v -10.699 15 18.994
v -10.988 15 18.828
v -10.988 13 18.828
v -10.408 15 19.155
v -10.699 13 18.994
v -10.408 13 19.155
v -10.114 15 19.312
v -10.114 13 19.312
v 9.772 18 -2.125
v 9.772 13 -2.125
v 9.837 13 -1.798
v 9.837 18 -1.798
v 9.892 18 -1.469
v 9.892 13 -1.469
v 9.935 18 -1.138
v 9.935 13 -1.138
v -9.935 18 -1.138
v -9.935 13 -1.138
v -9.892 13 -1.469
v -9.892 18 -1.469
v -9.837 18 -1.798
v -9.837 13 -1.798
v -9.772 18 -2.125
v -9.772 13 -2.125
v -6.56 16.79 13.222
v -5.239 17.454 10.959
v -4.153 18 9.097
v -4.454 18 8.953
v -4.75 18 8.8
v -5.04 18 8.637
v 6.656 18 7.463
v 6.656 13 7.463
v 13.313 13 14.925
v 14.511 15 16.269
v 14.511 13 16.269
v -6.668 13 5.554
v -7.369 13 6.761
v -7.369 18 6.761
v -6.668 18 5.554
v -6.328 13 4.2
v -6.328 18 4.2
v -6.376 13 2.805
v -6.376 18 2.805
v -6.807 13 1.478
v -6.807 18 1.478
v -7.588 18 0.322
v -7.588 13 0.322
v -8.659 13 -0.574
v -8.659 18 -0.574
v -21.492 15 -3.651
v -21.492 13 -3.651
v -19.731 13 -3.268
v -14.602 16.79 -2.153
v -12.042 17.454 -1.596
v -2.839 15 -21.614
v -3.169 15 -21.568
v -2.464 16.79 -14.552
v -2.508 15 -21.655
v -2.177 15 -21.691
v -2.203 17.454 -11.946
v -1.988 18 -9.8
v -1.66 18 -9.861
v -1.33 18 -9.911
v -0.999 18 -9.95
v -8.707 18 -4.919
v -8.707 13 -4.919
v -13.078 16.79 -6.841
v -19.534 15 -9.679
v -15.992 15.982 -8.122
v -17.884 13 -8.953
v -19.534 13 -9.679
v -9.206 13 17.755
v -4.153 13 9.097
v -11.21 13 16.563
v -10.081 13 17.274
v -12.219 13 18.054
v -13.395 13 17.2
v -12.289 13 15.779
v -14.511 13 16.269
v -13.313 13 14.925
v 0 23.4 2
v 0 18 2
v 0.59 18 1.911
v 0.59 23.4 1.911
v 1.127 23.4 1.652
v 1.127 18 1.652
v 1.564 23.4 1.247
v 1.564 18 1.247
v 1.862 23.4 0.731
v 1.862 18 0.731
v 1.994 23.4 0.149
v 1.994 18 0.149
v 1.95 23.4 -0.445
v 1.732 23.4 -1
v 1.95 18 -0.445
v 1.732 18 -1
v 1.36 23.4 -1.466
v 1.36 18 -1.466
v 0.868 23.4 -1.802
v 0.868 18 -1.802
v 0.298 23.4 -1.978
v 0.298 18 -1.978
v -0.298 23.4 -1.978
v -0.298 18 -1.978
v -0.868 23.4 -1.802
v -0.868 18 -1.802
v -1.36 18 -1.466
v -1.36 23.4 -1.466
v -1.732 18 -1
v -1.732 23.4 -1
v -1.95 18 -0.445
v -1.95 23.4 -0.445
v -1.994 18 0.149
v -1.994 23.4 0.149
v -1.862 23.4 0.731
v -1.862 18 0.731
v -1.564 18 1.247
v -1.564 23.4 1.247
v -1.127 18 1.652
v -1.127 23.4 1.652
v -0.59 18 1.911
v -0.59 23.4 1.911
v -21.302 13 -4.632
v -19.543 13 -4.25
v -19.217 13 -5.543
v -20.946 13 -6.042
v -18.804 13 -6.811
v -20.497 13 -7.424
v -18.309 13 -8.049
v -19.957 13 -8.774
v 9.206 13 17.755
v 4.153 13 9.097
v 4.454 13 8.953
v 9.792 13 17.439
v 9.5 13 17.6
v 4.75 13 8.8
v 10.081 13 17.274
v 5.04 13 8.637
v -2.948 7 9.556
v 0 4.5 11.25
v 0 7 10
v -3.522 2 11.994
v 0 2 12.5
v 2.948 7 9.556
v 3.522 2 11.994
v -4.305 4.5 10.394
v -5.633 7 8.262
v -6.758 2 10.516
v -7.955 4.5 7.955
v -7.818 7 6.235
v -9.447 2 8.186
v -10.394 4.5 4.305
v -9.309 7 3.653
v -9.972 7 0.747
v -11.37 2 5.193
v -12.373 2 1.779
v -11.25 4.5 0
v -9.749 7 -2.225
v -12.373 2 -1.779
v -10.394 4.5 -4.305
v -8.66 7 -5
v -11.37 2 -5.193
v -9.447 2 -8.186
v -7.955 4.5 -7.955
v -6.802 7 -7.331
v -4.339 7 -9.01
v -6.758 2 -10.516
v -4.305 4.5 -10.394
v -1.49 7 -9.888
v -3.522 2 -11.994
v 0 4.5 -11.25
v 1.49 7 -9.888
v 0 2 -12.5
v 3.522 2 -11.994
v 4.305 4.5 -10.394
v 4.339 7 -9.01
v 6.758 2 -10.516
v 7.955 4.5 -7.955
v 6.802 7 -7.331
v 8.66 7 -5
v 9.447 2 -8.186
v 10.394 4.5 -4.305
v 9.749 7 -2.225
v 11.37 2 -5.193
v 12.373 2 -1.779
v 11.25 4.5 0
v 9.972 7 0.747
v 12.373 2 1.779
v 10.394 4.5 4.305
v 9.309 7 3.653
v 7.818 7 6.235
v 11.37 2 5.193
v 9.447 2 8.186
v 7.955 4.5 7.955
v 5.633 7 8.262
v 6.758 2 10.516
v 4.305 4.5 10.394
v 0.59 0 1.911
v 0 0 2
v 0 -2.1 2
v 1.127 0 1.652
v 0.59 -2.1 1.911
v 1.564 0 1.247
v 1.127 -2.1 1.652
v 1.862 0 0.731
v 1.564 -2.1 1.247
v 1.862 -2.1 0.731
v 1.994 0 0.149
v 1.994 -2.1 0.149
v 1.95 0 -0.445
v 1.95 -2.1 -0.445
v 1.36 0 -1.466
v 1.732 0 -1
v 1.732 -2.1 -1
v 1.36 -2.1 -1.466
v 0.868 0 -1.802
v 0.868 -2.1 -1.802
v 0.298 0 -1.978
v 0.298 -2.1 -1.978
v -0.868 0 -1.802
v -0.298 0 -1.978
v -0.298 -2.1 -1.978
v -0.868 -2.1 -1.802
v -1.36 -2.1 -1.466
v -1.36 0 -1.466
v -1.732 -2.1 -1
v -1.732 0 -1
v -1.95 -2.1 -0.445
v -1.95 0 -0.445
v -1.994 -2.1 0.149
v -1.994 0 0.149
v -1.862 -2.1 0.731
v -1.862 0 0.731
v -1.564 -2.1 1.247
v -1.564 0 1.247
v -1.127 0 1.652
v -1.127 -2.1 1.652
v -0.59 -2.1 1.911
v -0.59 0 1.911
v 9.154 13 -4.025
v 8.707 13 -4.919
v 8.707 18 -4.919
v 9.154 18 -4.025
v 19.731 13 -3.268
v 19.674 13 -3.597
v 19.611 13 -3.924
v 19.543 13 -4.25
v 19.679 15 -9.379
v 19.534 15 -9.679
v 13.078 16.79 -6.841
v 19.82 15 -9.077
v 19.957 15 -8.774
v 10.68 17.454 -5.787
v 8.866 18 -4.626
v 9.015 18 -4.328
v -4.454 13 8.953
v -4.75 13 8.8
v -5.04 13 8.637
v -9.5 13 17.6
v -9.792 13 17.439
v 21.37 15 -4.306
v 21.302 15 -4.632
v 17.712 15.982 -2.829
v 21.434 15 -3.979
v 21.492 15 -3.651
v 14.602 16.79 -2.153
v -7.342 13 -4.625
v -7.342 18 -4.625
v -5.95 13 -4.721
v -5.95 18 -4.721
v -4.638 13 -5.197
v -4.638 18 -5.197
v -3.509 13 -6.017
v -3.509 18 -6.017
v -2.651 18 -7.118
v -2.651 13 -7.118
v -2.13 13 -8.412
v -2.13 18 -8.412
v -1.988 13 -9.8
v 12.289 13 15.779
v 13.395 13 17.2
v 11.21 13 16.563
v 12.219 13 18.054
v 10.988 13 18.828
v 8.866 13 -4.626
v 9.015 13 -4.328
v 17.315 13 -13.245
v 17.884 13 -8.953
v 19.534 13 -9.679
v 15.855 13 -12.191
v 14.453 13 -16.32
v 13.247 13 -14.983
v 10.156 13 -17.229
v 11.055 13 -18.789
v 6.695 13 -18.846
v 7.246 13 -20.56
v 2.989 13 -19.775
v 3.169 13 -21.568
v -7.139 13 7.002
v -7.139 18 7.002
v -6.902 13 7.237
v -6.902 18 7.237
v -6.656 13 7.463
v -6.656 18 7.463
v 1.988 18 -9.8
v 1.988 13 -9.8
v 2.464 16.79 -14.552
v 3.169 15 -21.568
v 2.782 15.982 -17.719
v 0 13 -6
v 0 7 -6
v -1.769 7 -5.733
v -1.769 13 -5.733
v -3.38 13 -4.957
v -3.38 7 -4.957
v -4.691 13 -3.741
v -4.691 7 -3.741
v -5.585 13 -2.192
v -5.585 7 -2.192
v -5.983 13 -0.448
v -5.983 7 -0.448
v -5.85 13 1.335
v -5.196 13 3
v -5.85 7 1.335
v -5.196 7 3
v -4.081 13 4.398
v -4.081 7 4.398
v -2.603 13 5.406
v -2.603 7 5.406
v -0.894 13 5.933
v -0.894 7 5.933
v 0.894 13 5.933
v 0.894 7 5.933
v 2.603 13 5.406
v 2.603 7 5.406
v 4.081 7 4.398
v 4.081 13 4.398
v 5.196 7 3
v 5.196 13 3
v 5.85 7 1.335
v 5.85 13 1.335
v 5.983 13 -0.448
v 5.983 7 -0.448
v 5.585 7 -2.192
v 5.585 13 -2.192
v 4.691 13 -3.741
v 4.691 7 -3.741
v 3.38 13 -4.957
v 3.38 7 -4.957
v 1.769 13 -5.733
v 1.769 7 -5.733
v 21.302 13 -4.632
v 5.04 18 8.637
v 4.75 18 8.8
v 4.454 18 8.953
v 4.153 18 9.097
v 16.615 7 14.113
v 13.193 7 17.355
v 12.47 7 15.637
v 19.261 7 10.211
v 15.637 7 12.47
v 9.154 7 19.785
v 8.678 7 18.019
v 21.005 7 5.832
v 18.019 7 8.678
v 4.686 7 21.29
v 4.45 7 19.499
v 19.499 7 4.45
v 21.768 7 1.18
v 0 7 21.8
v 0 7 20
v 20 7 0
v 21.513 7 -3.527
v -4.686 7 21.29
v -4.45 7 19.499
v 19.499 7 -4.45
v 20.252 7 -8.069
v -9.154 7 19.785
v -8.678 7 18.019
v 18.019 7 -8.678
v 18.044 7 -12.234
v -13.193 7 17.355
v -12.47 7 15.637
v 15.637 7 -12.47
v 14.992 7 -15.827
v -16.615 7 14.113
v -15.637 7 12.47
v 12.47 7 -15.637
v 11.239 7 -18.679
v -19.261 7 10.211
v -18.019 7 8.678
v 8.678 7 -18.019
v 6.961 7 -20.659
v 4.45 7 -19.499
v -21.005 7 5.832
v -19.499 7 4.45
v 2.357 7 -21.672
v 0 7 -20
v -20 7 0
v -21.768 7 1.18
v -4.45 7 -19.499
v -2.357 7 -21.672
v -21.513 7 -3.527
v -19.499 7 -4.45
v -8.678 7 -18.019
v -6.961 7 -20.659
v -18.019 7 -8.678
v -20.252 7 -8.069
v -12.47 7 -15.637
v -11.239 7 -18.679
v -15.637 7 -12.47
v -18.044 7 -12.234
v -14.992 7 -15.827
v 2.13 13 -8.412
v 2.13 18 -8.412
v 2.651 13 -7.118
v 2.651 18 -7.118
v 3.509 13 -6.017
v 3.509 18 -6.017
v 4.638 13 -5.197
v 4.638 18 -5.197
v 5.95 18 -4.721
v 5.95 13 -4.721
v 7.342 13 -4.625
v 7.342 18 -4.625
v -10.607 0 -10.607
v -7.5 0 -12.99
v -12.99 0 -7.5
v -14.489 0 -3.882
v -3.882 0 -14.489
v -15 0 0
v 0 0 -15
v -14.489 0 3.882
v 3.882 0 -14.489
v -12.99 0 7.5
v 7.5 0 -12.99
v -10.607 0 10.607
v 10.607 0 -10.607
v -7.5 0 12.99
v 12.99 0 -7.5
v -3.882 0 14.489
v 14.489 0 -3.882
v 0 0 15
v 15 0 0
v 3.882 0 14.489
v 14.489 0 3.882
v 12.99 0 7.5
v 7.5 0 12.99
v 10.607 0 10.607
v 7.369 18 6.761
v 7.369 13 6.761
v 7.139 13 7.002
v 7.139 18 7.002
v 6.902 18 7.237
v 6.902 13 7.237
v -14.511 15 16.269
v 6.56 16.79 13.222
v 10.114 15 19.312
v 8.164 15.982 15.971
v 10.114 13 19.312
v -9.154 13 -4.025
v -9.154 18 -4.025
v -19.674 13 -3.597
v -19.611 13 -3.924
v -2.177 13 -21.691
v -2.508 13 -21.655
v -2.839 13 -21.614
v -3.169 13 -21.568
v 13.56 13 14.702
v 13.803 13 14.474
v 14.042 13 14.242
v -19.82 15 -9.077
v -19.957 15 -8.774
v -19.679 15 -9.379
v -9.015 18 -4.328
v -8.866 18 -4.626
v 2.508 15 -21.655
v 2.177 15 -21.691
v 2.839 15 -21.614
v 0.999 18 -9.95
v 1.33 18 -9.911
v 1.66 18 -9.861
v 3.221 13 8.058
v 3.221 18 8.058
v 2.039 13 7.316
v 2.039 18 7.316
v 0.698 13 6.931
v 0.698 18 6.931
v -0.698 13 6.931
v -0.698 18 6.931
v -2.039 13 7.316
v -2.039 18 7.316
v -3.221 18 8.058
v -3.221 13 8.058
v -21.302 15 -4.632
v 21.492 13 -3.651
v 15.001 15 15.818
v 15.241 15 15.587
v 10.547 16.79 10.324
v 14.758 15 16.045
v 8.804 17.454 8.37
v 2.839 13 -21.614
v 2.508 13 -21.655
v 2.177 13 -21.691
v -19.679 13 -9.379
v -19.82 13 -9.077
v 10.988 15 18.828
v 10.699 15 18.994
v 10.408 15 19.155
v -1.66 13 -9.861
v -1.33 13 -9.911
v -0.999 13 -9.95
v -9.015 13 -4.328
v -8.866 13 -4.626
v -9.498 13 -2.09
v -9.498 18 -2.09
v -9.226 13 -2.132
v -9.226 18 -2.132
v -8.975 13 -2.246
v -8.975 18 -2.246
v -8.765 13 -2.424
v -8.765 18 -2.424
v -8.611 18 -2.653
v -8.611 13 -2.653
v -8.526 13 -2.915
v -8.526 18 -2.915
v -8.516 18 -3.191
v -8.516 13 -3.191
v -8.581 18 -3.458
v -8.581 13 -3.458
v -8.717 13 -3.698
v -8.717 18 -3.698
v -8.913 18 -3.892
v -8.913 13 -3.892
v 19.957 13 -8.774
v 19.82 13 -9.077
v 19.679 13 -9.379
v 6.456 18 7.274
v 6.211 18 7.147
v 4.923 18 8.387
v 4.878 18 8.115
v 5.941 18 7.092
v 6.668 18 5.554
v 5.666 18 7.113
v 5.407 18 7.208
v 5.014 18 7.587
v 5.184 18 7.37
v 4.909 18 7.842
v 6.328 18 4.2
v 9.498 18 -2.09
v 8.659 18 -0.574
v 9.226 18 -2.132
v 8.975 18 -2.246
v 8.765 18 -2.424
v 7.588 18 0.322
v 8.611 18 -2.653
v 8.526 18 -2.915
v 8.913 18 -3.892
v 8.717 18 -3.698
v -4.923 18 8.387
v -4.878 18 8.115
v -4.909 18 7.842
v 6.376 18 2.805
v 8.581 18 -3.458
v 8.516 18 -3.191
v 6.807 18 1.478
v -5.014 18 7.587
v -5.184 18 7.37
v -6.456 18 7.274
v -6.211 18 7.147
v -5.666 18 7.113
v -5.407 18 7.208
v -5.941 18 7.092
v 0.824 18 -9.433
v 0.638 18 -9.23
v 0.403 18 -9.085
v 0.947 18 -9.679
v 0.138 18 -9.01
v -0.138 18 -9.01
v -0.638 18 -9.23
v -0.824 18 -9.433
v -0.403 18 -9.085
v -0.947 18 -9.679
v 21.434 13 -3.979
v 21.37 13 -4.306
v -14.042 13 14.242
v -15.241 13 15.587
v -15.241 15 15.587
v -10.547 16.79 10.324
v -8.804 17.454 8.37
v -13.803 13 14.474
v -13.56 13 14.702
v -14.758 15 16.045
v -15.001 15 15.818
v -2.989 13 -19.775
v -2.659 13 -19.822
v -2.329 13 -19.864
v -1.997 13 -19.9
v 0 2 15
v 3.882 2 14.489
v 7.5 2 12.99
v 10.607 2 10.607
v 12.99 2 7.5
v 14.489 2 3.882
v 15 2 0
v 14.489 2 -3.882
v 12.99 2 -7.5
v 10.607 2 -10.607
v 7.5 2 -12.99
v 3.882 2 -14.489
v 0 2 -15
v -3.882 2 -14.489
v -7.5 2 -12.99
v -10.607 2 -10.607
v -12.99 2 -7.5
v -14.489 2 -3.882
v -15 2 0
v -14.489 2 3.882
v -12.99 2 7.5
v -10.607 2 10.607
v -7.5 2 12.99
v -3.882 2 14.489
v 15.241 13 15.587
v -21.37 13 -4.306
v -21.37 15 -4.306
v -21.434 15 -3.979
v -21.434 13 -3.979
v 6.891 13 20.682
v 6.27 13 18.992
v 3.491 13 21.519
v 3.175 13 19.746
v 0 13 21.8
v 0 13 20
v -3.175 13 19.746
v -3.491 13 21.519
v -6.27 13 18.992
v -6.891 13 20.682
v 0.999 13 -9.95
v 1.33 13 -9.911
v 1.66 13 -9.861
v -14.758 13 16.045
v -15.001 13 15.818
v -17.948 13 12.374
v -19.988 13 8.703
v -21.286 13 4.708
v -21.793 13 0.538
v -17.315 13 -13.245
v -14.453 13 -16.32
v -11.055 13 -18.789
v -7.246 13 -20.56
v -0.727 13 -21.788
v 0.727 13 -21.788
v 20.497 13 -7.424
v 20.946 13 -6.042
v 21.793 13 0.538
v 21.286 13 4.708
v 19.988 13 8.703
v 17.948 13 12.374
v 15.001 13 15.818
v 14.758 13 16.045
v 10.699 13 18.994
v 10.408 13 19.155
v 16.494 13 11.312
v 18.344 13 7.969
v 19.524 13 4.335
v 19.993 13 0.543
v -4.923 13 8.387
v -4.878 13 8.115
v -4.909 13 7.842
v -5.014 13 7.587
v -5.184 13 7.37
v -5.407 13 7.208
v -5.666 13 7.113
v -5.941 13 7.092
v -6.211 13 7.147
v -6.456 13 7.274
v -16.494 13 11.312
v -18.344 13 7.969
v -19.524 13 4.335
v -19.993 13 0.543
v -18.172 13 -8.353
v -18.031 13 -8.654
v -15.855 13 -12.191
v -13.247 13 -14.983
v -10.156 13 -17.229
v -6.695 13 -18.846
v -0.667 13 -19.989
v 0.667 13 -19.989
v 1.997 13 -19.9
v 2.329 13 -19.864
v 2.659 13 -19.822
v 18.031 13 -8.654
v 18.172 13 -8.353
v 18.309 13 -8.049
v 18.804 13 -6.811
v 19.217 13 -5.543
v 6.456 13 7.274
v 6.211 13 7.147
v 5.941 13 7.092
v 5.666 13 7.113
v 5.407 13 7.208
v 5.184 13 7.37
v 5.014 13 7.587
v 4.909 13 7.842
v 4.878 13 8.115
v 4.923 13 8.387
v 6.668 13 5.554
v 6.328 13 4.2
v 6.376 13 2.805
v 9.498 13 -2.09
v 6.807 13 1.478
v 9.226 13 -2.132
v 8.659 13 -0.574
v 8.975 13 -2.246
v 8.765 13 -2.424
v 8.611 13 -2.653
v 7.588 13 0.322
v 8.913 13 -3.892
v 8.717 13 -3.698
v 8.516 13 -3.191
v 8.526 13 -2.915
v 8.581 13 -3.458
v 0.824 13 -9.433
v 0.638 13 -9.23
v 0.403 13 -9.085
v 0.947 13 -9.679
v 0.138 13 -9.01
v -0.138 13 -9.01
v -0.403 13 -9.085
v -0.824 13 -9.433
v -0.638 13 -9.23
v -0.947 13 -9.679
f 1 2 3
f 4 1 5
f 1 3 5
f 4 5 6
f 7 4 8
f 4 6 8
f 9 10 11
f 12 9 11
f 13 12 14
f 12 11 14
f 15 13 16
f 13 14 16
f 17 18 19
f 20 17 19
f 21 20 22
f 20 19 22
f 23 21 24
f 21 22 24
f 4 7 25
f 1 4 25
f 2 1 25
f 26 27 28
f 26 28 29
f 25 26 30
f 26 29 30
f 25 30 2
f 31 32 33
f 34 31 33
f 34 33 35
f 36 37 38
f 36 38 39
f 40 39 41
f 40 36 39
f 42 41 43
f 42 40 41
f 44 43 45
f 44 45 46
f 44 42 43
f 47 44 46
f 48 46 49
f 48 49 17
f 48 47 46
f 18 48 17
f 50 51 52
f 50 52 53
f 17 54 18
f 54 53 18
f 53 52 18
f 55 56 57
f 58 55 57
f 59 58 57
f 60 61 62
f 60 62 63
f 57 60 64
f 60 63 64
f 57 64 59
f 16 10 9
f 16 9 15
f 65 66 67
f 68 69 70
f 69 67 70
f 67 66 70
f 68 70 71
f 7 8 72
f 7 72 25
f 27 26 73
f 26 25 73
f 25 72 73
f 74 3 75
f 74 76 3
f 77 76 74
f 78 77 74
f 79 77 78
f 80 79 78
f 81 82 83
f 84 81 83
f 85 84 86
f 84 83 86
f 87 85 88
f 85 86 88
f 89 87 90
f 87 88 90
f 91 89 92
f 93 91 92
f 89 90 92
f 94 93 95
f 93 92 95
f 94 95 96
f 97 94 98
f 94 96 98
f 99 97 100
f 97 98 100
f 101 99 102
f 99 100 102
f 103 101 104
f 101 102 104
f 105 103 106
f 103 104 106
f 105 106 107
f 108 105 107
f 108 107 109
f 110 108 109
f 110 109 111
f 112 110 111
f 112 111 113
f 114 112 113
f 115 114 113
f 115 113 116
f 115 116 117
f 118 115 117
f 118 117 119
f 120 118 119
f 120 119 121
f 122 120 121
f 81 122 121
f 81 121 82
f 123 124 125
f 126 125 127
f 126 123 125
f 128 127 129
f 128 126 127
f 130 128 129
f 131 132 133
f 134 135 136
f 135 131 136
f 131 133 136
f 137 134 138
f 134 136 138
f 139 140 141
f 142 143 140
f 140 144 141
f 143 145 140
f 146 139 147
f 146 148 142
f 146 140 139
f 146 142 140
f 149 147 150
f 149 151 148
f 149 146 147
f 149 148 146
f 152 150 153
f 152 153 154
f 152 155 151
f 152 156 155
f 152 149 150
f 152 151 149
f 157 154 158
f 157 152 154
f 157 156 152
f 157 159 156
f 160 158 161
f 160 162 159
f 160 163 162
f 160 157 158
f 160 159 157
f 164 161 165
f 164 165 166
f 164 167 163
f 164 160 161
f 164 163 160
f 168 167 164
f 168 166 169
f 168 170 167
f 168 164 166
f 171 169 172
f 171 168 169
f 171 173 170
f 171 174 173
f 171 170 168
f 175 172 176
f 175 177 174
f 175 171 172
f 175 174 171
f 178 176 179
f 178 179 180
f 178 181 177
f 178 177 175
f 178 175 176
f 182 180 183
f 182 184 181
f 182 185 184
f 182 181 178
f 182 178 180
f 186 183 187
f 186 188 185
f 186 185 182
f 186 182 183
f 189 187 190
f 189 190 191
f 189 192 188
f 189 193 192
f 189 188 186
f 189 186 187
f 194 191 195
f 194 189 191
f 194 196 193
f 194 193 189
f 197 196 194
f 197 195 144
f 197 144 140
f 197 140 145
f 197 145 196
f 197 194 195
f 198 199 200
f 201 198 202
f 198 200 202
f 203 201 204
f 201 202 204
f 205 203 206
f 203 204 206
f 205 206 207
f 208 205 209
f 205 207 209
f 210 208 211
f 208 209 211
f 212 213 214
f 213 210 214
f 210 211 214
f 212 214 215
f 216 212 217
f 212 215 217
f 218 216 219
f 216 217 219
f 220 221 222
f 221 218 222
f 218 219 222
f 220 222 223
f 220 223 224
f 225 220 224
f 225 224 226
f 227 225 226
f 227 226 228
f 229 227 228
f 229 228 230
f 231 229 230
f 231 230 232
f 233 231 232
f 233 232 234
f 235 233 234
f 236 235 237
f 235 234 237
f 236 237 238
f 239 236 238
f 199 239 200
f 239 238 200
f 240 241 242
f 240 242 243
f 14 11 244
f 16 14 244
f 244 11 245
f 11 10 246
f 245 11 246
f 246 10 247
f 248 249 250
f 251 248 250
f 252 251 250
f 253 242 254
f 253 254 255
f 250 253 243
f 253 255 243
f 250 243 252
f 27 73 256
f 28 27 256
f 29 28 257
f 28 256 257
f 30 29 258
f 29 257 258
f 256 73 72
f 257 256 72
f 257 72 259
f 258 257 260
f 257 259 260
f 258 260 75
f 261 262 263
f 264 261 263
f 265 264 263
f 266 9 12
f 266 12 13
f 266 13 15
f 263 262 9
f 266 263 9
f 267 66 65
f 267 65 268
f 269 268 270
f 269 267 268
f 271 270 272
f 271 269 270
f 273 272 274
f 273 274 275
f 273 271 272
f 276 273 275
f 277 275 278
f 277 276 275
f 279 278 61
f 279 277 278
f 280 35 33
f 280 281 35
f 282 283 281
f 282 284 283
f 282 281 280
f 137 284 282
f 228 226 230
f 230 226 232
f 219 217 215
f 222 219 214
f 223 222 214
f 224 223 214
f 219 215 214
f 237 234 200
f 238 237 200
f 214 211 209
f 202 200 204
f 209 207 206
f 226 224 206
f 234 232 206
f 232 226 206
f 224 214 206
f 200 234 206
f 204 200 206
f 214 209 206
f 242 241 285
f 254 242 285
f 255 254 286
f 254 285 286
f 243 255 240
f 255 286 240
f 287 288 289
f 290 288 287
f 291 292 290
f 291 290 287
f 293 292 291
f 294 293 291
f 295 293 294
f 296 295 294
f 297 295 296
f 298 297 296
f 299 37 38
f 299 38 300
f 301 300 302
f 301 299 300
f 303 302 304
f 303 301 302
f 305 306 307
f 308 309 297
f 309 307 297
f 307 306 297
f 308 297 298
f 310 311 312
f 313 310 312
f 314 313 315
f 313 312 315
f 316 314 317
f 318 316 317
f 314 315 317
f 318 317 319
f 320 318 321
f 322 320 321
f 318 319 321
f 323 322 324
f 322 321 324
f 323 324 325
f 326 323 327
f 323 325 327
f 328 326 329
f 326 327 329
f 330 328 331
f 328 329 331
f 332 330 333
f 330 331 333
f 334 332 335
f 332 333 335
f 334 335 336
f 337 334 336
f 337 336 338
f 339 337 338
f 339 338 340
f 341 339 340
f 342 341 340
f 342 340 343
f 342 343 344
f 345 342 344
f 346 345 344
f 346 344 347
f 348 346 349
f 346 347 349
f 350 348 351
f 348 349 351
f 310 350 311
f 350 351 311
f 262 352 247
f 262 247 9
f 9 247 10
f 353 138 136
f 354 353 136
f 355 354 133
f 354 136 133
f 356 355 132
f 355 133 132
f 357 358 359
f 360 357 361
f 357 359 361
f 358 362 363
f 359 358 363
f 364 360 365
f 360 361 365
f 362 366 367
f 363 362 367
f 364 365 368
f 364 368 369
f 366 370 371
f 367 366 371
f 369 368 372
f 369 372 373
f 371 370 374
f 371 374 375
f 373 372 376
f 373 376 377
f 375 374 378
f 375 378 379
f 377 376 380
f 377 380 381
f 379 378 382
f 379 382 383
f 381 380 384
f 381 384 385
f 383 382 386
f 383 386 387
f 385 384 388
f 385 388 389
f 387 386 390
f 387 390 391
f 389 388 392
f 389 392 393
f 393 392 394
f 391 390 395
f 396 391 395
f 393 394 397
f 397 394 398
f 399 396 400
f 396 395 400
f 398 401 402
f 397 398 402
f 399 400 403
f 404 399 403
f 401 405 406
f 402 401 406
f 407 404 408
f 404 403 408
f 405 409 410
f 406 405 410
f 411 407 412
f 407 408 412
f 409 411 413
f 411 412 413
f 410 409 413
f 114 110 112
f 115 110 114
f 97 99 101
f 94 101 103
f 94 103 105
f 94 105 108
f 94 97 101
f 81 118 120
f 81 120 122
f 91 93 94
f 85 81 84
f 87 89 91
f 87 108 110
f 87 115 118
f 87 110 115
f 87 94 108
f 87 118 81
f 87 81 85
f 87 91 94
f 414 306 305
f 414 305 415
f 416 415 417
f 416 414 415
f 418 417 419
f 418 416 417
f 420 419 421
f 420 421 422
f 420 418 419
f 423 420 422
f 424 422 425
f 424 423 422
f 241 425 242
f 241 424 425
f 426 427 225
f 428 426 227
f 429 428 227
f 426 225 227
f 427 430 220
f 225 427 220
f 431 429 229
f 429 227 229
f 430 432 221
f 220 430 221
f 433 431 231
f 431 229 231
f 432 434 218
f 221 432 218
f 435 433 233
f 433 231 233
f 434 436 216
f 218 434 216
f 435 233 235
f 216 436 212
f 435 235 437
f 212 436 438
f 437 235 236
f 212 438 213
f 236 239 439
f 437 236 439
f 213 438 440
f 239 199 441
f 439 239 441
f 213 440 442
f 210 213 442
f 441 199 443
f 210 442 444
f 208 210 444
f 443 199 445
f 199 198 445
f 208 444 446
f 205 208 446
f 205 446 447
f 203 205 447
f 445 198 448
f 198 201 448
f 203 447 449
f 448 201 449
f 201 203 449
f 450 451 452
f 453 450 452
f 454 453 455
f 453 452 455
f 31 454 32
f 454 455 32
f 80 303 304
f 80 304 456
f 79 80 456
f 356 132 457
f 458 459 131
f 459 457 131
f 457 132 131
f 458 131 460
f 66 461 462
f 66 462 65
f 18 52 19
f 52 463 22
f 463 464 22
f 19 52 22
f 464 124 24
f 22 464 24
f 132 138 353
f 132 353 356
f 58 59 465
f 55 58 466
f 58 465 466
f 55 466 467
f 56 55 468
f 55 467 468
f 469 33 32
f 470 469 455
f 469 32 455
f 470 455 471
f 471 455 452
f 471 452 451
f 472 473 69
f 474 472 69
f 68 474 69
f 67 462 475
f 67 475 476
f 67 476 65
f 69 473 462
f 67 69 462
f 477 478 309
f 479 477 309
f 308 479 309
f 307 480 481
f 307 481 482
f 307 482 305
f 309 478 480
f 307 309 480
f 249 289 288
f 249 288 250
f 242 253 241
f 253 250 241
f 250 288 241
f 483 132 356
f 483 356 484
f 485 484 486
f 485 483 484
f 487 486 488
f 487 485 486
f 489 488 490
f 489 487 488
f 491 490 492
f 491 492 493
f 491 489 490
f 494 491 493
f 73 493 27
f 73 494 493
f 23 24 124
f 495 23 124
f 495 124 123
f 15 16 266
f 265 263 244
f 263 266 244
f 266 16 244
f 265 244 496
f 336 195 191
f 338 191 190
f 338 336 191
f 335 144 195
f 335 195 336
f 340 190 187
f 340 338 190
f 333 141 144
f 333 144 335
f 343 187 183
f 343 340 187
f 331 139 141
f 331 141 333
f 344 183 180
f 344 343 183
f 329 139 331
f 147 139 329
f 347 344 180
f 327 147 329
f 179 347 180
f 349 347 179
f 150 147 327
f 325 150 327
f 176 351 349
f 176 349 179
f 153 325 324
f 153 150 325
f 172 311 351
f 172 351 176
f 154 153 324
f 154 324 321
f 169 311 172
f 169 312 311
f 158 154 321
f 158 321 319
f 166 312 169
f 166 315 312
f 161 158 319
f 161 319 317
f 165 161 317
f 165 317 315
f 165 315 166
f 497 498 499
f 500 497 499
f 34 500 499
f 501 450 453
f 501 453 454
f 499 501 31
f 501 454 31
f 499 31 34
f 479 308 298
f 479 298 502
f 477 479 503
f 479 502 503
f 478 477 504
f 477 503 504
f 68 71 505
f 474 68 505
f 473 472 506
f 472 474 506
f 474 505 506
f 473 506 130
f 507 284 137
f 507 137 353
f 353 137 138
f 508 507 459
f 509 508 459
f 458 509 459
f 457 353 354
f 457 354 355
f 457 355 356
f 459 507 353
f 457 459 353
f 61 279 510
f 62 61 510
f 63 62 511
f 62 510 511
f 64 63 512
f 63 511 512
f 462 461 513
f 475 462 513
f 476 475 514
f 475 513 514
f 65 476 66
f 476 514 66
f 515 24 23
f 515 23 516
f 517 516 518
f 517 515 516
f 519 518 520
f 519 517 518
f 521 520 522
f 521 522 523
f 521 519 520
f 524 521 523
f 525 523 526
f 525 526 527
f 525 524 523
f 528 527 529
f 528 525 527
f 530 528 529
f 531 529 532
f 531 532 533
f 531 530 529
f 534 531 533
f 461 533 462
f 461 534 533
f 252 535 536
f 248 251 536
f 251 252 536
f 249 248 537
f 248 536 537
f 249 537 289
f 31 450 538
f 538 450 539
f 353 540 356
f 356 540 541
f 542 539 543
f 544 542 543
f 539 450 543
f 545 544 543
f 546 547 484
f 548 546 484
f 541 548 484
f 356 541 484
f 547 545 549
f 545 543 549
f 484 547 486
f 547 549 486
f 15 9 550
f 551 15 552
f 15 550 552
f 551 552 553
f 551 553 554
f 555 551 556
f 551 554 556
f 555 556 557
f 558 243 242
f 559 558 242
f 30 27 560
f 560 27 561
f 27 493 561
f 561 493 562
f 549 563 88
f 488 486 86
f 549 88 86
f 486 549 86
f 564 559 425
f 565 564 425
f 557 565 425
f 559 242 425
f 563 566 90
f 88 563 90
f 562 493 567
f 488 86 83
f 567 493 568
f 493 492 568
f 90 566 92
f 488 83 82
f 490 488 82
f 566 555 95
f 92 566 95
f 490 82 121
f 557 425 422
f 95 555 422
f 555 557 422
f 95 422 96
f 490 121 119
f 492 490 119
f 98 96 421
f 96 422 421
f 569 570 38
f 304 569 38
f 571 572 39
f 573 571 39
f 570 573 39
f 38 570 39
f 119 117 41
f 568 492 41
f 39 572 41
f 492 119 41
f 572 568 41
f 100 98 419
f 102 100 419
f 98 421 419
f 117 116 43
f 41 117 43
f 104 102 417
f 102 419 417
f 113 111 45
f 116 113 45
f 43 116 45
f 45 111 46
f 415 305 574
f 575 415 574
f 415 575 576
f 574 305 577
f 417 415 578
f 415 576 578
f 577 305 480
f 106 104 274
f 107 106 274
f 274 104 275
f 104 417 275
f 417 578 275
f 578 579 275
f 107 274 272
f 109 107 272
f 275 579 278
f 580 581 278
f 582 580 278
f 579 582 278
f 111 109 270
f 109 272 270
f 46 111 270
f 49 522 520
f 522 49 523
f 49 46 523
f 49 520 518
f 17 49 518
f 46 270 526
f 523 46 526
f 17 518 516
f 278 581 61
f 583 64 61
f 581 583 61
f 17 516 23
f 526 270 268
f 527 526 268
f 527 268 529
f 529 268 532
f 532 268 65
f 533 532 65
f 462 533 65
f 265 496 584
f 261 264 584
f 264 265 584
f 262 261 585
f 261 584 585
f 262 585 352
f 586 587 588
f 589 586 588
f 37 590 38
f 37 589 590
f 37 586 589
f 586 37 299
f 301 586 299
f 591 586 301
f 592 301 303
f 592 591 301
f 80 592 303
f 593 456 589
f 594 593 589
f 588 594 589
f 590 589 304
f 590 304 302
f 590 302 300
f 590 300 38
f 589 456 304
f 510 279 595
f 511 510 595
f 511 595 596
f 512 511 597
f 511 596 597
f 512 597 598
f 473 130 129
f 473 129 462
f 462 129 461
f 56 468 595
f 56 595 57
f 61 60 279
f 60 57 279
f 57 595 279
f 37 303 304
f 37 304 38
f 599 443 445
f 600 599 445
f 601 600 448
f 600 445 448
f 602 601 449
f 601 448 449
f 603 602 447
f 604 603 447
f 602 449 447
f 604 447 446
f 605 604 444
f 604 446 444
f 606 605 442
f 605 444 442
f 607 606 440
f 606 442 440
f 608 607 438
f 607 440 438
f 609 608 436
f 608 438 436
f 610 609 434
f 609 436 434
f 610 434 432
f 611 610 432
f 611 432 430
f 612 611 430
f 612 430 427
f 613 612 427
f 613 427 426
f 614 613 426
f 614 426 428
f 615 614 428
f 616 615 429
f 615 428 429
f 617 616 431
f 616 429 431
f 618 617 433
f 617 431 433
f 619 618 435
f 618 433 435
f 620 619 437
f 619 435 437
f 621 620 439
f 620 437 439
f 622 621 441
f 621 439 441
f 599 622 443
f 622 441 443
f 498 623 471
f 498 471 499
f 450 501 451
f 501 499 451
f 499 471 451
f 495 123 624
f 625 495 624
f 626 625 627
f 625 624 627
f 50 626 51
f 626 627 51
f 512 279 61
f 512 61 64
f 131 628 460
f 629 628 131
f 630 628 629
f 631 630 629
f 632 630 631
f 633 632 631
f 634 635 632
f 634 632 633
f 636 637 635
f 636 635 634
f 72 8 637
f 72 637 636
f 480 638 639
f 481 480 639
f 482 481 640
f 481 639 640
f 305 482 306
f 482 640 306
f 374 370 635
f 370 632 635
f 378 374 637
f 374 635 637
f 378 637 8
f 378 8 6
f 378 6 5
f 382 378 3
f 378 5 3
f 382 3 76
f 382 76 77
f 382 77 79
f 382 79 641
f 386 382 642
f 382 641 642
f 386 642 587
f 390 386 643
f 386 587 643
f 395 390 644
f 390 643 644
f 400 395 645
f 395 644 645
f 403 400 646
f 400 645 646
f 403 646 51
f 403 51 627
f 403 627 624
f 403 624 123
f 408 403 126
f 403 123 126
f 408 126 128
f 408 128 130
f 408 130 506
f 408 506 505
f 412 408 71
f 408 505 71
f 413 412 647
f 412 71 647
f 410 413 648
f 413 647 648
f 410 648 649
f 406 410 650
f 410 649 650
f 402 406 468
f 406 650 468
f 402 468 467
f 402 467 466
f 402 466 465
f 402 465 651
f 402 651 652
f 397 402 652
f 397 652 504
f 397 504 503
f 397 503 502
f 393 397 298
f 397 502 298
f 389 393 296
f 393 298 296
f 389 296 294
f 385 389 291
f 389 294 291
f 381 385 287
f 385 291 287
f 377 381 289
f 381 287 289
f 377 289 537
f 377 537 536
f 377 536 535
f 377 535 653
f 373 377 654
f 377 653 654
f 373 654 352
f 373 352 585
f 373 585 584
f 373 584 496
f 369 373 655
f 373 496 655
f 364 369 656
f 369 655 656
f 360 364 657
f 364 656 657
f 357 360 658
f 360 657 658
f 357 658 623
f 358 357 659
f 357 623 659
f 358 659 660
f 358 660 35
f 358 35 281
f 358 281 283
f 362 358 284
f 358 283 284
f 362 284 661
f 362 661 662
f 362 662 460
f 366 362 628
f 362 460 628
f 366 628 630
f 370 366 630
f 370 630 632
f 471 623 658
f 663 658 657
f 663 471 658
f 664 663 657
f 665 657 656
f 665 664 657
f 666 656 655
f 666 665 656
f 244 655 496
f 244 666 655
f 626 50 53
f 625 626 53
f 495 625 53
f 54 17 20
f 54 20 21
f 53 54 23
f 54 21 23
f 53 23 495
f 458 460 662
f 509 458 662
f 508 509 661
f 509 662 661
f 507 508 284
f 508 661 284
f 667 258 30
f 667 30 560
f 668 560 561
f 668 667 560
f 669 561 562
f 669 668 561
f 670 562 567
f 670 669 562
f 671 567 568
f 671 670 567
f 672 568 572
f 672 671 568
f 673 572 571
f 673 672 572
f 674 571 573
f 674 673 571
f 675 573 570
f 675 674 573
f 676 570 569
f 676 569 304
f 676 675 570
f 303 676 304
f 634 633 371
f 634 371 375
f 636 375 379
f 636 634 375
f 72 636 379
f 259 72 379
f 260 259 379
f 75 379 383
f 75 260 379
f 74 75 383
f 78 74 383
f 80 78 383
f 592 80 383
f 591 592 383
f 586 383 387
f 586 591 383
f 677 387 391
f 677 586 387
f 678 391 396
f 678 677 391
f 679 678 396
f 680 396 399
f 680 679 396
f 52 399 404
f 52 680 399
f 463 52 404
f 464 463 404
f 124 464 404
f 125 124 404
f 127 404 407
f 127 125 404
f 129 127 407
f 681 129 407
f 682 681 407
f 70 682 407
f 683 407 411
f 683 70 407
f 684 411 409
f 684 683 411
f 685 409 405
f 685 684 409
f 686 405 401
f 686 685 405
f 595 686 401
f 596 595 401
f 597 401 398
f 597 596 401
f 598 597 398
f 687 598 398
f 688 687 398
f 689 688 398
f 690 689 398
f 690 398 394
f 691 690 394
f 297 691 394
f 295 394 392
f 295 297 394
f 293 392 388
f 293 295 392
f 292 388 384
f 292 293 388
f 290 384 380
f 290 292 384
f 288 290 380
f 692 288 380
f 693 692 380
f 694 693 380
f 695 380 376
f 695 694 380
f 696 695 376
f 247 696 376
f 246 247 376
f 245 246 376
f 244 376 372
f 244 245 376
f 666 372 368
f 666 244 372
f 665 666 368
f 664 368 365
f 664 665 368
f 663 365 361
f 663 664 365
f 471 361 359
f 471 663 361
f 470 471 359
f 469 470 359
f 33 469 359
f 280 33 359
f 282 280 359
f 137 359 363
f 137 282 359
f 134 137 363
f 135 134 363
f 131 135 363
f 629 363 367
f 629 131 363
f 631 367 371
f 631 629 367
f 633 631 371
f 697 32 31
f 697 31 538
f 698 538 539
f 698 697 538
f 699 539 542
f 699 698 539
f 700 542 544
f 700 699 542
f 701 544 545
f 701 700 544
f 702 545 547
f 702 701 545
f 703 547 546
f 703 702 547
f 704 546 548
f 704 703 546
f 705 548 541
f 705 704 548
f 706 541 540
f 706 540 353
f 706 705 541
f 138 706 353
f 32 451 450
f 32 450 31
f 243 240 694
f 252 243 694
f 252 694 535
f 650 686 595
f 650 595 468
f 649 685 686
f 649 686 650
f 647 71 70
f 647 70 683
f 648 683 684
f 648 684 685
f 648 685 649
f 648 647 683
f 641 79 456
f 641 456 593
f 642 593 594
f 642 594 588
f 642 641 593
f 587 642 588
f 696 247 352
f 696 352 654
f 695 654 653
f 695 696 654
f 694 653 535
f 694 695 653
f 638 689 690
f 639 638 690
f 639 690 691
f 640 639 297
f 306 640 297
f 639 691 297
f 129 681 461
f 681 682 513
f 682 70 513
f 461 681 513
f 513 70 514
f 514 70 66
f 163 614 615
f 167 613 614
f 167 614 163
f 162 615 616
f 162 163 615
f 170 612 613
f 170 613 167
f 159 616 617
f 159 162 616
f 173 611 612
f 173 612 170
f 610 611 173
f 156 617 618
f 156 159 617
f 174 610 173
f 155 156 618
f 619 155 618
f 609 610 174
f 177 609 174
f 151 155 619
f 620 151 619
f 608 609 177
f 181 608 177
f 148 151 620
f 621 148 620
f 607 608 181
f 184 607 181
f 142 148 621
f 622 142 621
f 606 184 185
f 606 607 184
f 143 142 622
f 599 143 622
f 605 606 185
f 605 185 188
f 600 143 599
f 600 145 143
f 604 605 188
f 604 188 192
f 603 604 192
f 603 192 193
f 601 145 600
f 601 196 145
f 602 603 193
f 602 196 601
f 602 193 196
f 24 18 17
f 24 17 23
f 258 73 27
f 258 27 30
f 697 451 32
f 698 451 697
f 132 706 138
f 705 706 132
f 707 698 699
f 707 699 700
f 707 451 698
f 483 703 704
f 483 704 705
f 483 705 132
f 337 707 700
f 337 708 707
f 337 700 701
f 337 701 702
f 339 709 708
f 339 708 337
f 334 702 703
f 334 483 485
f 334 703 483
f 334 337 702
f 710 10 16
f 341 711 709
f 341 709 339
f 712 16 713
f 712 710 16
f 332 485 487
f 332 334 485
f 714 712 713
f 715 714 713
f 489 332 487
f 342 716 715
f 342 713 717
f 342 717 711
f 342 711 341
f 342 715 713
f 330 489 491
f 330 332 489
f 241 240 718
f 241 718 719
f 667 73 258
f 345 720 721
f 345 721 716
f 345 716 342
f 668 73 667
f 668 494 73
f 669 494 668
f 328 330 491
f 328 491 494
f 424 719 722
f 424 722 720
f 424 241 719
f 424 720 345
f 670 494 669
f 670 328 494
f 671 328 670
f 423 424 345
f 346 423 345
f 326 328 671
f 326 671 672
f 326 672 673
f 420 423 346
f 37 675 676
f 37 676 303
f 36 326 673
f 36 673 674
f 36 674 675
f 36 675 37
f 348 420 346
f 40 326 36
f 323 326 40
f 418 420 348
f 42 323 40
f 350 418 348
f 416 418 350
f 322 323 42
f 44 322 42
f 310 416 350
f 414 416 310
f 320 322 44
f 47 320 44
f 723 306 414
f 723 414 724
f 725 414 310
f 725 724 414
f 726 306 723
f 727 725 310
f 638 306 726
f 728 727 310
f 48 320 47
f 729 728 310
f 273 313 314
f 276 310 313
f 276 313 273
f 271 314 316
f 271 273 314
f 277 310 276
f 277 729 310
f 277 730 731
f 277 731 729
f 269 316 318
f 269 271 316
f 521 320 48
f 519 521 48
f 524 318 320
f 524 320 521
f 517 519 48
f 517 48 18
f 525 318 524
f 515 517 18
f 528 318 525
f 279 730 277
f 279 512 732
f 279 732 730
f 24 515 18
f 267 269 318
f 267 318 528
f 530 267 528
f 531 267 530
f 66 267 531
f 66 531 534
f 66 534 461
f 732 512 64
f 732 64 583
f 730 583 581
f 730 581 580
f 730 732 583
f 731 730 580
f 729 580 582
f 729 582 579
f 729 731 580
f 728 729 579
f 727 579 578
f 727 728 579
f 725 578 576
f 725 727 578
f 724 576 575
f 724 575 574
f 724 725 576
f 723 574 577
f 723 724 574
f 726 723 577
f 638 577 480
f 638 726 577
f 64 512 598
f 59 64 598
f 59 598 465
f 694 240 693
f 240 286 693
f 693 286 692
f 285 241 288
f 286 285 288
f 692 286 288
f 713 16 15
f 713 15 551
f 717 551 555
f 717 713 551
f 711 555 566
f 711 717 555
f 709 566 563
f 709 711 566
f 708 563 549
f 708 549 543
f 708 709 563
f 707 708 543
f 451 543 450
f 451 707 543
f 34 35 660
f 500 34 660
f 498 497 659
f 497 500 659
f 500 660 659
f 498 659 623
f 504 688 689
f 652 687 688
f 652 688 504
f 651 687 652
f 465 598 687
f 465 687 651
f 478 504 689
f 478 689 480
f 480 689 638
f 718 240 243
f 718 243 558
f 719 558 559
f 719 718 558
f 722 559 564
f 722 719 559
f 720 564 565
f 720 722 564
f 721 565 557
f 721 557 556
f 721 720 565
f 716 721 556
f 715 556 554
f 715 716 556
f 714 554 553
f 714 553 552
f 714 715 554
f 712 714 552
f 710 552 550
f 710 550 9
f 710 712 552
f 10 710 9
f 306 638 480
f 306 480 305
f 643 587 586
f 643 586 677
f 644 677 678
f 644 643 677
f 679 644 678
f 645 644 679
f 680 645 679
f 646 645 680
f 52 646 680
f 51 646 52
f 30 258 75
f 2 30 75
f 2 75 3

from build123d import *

# Parameters (mm, degrees)
SKETCH_4_R               = 15
EXTRUDE_2_DEPTH          = 2
EXTRUDE_3_DEPTH          = 21.4
EXTRUDE_3_DEPTH_BACK     = 4.1
SKETCH_5_R               = 2
SKETCH_9_W               = 1.8
SKETCH_9_H               = 6
SKETCH_10_R              = 6
SKETCH_10_R_2            = 2
EXTRUDE_5_DEPTH          = 6
SKETCH_11_R              = 2
EXTRUDE_6_DEPTH          = 5
EXTRUDE_7_DEPTH          = 5
PATTERN_START            = 13
PATTERN_CIRCULAR_1_DEPTH = 5


# Read off the part's stored shape, not the designer's step: 阵列(圆周)1
with BuildPart() as part:
    # 草图4 → 凸台-拉伸2 (new body)
    with BuildSketch(Plane(origin=(0, 0, 0), x_dir=(1, 0, 0), z_dir=(0, 1, 0))):
        with Locations(Location((0, 0, 0), (0, 0, 270))):
            Circle(SKETCH_4_R)
    extrude(amount=EXTRUDE_2_DEPTH)

    # 草图5 → 凸台-拉伸3 (add, two sides: drawn at the far end of the back side and taken through both)
    with BuildSketch(Plane(origin=(0, 2, 0), x_dir=(1, 0, 0), z_dir=(0, 1, 0)).offset(-EXTRUDE_3_DEPTH_BACK)):
        with Locations(Location((0, 0, 0), (0, 0, 270))):
            Circle(SKETCH_5_R)
    extrude(amount=EXTRUDE_3_DEPTH + EXTRUDE_3_DEPTH_BACK)

    # 草图8 → 旋转2 (revolve)
    with BuildSketch(Plane.XY, mode=Mode.PRIVATE) as revolve_2_sk:
        Polygon((2, 2), (2, 7), (10, 7), (12.5, 2), align=None)
    revolve(revolve_2_sk.sketch.rotate(Axis((0, 58, 0), (0, -1, 0)), 90), axis=Axis((0, 58, 0), (0, -1, 0)))

    # 草图10 → 凸台-拉伸5 (add)
    with BuildSketch(Plane(origin=(0, 7, 0), x_dir=(1, 0, 0), z_dir=(0, 1, 0))):
        with Locations(Location((0, 0, 0), (0, 0, 90))):
            Circle(SKETCH_10_R)
        with Locations(Location((0, 0, 0), (0, 0, 270))):
            Circle(SKETCH_10_R_2, mode=Mode.SUBTRACT)
    extrude(amount=EXTRUDE_5_DEPTH)

    # 草图11 → 凸台-拉伸6 (add)
    with BuildSketch(Plane(origin=(0, 13, 0), x_dir=(1, 0, 0), z_dir=(0, 1, 0))):
        with BuildLine():
            Line((0.998749218, 9.95), (1.987510943, 9.8005))
            ThreePointArc((1.987510943, 9.8005), (4.045053686, 5.567538761), (8.70665473, 4.918756287))
            Line((8.70665473, 4.918756287), (9.154381856, 4.024586046))
            ThreePointArc((9.154381856, 4.024586046), (8.559508647, 2.781152949), (9.771642819, 2.124852142))
            Line((9.771642819, 2.124852142), (9.935004046, 1.138285819))
            ThreePointArc((9.935004046, 1.138285819), (6.54503435, -2.126610573), (7.368519495, -6.760541432))
            Line((7.368519495, -6.760541432), (6.656468351, -7.462669033))
            ThreePointArc((6.656468351, -7.462669033), (5.290067271, -7.281152949), (5.04045817, -8.636769155))
            Line((5.04045817, -8.636769155), (4.152659235, -9.097000675))
            ThreePointArc((4.152659235, -9.097000675), (0, -6.881856376), (-4.152659235, -9.097000675))
            Line((-4.152659235, -9.097000675), (-5.04045817, -8.636769155))
            ThreePointArc((-5.04045817, -8.636769155), (-5.290067271, -7.281152949), (-6.656468351, -7.462669033))
            Line((-6.656468351, -7.462669033), (-7.368519495, -6.760541432))
            ThreePointArc((-7.368519495, -6.760541432), (-6.54503435, -2.126610573), (-9.935004046, 1.138285819))
            Line((-9.935004046, 1.138285819), (-9.771642819, 2.124852142))
            ThreePointArc((-9.771642819, 2.124852142), (-8.559508647, 2.781152949), (-9.154381856, 4.024586046))
            Line((-9.154381856, 4.024586046), (-8.70665473, 4.918756287))
            ThreePointArc((-8.70665473, 4.918756287), (-4.045053686, 5.567538761), (-1.987510943, 9.8005))
            Line((-1.987510943, 9.8005), (-0.998749218, 9.95))
            ThreePointArc((-0.998749218, 9.95), (0, 9), (0.998749218, 9.95))
        make_face()
        with Locations(Location((0, 0, 0), (0, 0, 270))):
            Circle(SKETCH_11_R, mode=Mode.SUBTRACT)
    extrude(amount=EXTRUDE_6_DEPTH)


with BuildPart() as body_2:
    # 草图9 → 旋转3 (revolve)
    with BuildSketch(Plane.XY, mode=Mode.PRIVATE) as revolve_3_sk:
        with Locations((20.9, 10)):
            Rectangle(SKETCH_9_W, SKETCH_9_H)
    revolve(revolve_3_sk.sketch.rotate(Axis((0, 58, 0), (0, -1, 0)), 90), axis=Axis((0, 58, 0), (0, -1, 0)))

    # 草图13 → 凸台-拉伸7 (add)
    with BuildSketch(Plane.XZ.offset(-13)):
        with BuildLine():
            Line((-6.656468351, 7.462669033), (-14.511101004, 16.268618492))
            ThreePointArc((-14.511101004, 16.268618492), (-14.880055872, 15.931852913), (-15.241197529, 15.586721845))
            Line((-15.241197529, 15.586721845), (-7.368519495, 6.760541432))
            ThreePointArc((-7.368519495, 6.760541432), (-7.02127601, 7.120511442), (-6.656468351, 7.462669033))
        make_face()
        with BuildLine():
            Line((-5.04045817, 8.636769155), (-10.988198811, 18.828156758))
            ThreePointArc((-10.988198811, 18.828156758), (-10.553902387, 19.074987402), (-10.114064327, 19.311802163))
            Line((-10.114064327, 19.311802163), (-4.152659235, 9.097000675))
            ThreePointArc((-4.152659235, 9.097000675), (-4.602315197, 8.877989346), (-5.04045817, 8.636769155))
        make_face()
    extrude(amount=-EXTRUDE_7_DEPTH)

    # 阵列(圆周)1 outline → 阵列(圆周)1 (add)
    with BuildSketch(Plane(origin=(0, 0, 0), x_dir=(1, 0, 0), z_dir=(0, 1, 0)).offset(PATTERN_START)):
        with BuildLine():
            Line((-19.956552445, 8.77359758), (-9.154381856, 4.024586046))
            ThreePointArc((-9.154381856, 4.024586046), (-8.941702415, 4.477271258), (-8.70665473, 4.918756287))
            Line((-8.70665473, 4.918756287), (-19.533642429, 9.67867829))
            ThreePointArc((-19.533642429, 9.67867829), (-19.750282671, 9.228560799), (-19.956552445, 8.77359758))
        make_face()
        with BuildLine():
            Line((-9.771642819, 2.124852142), (-21.302181344, 4.63217767))
            ThreePointArc((-21.302181344, 4.63217767), (-21.402726262, 4.142862363), (-21.492033048, 3.651371724))
            Line((-21.492033048, 3.651371724), (-9.935004046, 1.138285819))
            ThreePointArc((-9.935004046, 1.138285819), (-9.865663228, 1.633612274), (-9.771642819, 2.124852142))
        make_face()
        with BuildLine():
            ThreePointArc((-2.177273295, 21.691), (-2.673709895, 21.635417153), (-3.168742584, 21.568473994))
            Line((-3.168742584, 21.568473994), (-1.987510943, 9.8005))
            ThreePointArc((-1.987510943, 9.8005), (-1.495, 9.887617256), (-0.998749218, 9.95))
            Line((-0.998749218, 9.95), (-2.177273295, 21.691))
        make_face()
        with BuildLine():
            Line((4.152659235, -9.097000675), (10.114064327, -19.311802163))
            ThreePointArc((10.114064327, -19.311802163), (10.553902388, -19.074987402), (10.988198811, -18.828156758))
            Line((10.988198811, -18.828156758), (5.04045817, -8.636769155))
            ThreePointArc((5.04045817, -8.636769155), (4.602315197, -8.877989346), (4.152659235, -9.097000675))
        make_face()
        with BuildLine():
            ThreePointArc((3.168742584, 21.568473994), (2.673709895, 21.635417153), (2.177273295, 21.691))
            Line((2.177273295, 21.691), (0.998749218, 9.95))
            ThreePointArc((0.998749218, 9.95), (1.495, 9.887617256), (1.987510943, 9.8005))
            Line((1.987510943, 9.8005), (3.168742584, 21.568473994))
        make_face()
        with BuildLine():
            Line((6.656468351, -7.462669033), (14.511101004, -16.268618492))
            ThreePointArc((14.511101004, -16.268618492), (14.880055872, -15.931852913), (15.241197529, -15.586721845))
            Line((15.241197529, -15.586721845), (7.368519495, -6.760541432))
            ThreePointArc((7.368519495, -6.760541432), (7.02127601, -7.120511442), (6.656468351, -7.462669033))
        make_face()
        with BuildLine():
            ThreePointArc((19.956552445, 8.77359758), (19.750282671, 9.228560799), (19.533642429, 9.67867829))
            Line((19.533642429, 9.67867829), (8.70665473, 4.918756287))
            ThreePointArc((8.70665473, 4.918756287), (8.941702415, 4.477271258), (9.154381856, 4.024586046))
            Line((9.154381856, 4.024586046), (19.956552445, 8.77359758))
        make_face()
        with BuildLine():
            ThreePointArc((21.492033048, 3.651371724), (21.402726262, 4.142862363), (21.302181344, 4.63217767))
            Line((21.302181344, 4.63217767), (9.771642819, 2.124852142))
            ThreePointArc((9.771642819, 2.124852142), (9.865663228, 1.633612274), (9.935004046, 1.138285819))
            Line((9.935004046, 1.138285819), (21.492033048, 3.651371724))
        make_face()
    extrude(amount=PATTERN_CIRCULAR_1_DEPTH)

    # 草图16 → 切除-旋转1 (revolve, cut)
    with BuildSketch(Plane(origin=(0, 0, 0), x_dir=(0.6656468350603115, 0, -0.7462669033088567), z_dir=(0.7462669033088567, 0, 0.6656468350603115))):
        Polygon((-21.8, 18), (-21.8, 15), (-10, 18), align=None)
    revolve(axis=Axis((0, 58, 0), (0, -1, 0)), mode=Mode.SUBTRACT)


solid = Compound([part.part, body_2.part])
